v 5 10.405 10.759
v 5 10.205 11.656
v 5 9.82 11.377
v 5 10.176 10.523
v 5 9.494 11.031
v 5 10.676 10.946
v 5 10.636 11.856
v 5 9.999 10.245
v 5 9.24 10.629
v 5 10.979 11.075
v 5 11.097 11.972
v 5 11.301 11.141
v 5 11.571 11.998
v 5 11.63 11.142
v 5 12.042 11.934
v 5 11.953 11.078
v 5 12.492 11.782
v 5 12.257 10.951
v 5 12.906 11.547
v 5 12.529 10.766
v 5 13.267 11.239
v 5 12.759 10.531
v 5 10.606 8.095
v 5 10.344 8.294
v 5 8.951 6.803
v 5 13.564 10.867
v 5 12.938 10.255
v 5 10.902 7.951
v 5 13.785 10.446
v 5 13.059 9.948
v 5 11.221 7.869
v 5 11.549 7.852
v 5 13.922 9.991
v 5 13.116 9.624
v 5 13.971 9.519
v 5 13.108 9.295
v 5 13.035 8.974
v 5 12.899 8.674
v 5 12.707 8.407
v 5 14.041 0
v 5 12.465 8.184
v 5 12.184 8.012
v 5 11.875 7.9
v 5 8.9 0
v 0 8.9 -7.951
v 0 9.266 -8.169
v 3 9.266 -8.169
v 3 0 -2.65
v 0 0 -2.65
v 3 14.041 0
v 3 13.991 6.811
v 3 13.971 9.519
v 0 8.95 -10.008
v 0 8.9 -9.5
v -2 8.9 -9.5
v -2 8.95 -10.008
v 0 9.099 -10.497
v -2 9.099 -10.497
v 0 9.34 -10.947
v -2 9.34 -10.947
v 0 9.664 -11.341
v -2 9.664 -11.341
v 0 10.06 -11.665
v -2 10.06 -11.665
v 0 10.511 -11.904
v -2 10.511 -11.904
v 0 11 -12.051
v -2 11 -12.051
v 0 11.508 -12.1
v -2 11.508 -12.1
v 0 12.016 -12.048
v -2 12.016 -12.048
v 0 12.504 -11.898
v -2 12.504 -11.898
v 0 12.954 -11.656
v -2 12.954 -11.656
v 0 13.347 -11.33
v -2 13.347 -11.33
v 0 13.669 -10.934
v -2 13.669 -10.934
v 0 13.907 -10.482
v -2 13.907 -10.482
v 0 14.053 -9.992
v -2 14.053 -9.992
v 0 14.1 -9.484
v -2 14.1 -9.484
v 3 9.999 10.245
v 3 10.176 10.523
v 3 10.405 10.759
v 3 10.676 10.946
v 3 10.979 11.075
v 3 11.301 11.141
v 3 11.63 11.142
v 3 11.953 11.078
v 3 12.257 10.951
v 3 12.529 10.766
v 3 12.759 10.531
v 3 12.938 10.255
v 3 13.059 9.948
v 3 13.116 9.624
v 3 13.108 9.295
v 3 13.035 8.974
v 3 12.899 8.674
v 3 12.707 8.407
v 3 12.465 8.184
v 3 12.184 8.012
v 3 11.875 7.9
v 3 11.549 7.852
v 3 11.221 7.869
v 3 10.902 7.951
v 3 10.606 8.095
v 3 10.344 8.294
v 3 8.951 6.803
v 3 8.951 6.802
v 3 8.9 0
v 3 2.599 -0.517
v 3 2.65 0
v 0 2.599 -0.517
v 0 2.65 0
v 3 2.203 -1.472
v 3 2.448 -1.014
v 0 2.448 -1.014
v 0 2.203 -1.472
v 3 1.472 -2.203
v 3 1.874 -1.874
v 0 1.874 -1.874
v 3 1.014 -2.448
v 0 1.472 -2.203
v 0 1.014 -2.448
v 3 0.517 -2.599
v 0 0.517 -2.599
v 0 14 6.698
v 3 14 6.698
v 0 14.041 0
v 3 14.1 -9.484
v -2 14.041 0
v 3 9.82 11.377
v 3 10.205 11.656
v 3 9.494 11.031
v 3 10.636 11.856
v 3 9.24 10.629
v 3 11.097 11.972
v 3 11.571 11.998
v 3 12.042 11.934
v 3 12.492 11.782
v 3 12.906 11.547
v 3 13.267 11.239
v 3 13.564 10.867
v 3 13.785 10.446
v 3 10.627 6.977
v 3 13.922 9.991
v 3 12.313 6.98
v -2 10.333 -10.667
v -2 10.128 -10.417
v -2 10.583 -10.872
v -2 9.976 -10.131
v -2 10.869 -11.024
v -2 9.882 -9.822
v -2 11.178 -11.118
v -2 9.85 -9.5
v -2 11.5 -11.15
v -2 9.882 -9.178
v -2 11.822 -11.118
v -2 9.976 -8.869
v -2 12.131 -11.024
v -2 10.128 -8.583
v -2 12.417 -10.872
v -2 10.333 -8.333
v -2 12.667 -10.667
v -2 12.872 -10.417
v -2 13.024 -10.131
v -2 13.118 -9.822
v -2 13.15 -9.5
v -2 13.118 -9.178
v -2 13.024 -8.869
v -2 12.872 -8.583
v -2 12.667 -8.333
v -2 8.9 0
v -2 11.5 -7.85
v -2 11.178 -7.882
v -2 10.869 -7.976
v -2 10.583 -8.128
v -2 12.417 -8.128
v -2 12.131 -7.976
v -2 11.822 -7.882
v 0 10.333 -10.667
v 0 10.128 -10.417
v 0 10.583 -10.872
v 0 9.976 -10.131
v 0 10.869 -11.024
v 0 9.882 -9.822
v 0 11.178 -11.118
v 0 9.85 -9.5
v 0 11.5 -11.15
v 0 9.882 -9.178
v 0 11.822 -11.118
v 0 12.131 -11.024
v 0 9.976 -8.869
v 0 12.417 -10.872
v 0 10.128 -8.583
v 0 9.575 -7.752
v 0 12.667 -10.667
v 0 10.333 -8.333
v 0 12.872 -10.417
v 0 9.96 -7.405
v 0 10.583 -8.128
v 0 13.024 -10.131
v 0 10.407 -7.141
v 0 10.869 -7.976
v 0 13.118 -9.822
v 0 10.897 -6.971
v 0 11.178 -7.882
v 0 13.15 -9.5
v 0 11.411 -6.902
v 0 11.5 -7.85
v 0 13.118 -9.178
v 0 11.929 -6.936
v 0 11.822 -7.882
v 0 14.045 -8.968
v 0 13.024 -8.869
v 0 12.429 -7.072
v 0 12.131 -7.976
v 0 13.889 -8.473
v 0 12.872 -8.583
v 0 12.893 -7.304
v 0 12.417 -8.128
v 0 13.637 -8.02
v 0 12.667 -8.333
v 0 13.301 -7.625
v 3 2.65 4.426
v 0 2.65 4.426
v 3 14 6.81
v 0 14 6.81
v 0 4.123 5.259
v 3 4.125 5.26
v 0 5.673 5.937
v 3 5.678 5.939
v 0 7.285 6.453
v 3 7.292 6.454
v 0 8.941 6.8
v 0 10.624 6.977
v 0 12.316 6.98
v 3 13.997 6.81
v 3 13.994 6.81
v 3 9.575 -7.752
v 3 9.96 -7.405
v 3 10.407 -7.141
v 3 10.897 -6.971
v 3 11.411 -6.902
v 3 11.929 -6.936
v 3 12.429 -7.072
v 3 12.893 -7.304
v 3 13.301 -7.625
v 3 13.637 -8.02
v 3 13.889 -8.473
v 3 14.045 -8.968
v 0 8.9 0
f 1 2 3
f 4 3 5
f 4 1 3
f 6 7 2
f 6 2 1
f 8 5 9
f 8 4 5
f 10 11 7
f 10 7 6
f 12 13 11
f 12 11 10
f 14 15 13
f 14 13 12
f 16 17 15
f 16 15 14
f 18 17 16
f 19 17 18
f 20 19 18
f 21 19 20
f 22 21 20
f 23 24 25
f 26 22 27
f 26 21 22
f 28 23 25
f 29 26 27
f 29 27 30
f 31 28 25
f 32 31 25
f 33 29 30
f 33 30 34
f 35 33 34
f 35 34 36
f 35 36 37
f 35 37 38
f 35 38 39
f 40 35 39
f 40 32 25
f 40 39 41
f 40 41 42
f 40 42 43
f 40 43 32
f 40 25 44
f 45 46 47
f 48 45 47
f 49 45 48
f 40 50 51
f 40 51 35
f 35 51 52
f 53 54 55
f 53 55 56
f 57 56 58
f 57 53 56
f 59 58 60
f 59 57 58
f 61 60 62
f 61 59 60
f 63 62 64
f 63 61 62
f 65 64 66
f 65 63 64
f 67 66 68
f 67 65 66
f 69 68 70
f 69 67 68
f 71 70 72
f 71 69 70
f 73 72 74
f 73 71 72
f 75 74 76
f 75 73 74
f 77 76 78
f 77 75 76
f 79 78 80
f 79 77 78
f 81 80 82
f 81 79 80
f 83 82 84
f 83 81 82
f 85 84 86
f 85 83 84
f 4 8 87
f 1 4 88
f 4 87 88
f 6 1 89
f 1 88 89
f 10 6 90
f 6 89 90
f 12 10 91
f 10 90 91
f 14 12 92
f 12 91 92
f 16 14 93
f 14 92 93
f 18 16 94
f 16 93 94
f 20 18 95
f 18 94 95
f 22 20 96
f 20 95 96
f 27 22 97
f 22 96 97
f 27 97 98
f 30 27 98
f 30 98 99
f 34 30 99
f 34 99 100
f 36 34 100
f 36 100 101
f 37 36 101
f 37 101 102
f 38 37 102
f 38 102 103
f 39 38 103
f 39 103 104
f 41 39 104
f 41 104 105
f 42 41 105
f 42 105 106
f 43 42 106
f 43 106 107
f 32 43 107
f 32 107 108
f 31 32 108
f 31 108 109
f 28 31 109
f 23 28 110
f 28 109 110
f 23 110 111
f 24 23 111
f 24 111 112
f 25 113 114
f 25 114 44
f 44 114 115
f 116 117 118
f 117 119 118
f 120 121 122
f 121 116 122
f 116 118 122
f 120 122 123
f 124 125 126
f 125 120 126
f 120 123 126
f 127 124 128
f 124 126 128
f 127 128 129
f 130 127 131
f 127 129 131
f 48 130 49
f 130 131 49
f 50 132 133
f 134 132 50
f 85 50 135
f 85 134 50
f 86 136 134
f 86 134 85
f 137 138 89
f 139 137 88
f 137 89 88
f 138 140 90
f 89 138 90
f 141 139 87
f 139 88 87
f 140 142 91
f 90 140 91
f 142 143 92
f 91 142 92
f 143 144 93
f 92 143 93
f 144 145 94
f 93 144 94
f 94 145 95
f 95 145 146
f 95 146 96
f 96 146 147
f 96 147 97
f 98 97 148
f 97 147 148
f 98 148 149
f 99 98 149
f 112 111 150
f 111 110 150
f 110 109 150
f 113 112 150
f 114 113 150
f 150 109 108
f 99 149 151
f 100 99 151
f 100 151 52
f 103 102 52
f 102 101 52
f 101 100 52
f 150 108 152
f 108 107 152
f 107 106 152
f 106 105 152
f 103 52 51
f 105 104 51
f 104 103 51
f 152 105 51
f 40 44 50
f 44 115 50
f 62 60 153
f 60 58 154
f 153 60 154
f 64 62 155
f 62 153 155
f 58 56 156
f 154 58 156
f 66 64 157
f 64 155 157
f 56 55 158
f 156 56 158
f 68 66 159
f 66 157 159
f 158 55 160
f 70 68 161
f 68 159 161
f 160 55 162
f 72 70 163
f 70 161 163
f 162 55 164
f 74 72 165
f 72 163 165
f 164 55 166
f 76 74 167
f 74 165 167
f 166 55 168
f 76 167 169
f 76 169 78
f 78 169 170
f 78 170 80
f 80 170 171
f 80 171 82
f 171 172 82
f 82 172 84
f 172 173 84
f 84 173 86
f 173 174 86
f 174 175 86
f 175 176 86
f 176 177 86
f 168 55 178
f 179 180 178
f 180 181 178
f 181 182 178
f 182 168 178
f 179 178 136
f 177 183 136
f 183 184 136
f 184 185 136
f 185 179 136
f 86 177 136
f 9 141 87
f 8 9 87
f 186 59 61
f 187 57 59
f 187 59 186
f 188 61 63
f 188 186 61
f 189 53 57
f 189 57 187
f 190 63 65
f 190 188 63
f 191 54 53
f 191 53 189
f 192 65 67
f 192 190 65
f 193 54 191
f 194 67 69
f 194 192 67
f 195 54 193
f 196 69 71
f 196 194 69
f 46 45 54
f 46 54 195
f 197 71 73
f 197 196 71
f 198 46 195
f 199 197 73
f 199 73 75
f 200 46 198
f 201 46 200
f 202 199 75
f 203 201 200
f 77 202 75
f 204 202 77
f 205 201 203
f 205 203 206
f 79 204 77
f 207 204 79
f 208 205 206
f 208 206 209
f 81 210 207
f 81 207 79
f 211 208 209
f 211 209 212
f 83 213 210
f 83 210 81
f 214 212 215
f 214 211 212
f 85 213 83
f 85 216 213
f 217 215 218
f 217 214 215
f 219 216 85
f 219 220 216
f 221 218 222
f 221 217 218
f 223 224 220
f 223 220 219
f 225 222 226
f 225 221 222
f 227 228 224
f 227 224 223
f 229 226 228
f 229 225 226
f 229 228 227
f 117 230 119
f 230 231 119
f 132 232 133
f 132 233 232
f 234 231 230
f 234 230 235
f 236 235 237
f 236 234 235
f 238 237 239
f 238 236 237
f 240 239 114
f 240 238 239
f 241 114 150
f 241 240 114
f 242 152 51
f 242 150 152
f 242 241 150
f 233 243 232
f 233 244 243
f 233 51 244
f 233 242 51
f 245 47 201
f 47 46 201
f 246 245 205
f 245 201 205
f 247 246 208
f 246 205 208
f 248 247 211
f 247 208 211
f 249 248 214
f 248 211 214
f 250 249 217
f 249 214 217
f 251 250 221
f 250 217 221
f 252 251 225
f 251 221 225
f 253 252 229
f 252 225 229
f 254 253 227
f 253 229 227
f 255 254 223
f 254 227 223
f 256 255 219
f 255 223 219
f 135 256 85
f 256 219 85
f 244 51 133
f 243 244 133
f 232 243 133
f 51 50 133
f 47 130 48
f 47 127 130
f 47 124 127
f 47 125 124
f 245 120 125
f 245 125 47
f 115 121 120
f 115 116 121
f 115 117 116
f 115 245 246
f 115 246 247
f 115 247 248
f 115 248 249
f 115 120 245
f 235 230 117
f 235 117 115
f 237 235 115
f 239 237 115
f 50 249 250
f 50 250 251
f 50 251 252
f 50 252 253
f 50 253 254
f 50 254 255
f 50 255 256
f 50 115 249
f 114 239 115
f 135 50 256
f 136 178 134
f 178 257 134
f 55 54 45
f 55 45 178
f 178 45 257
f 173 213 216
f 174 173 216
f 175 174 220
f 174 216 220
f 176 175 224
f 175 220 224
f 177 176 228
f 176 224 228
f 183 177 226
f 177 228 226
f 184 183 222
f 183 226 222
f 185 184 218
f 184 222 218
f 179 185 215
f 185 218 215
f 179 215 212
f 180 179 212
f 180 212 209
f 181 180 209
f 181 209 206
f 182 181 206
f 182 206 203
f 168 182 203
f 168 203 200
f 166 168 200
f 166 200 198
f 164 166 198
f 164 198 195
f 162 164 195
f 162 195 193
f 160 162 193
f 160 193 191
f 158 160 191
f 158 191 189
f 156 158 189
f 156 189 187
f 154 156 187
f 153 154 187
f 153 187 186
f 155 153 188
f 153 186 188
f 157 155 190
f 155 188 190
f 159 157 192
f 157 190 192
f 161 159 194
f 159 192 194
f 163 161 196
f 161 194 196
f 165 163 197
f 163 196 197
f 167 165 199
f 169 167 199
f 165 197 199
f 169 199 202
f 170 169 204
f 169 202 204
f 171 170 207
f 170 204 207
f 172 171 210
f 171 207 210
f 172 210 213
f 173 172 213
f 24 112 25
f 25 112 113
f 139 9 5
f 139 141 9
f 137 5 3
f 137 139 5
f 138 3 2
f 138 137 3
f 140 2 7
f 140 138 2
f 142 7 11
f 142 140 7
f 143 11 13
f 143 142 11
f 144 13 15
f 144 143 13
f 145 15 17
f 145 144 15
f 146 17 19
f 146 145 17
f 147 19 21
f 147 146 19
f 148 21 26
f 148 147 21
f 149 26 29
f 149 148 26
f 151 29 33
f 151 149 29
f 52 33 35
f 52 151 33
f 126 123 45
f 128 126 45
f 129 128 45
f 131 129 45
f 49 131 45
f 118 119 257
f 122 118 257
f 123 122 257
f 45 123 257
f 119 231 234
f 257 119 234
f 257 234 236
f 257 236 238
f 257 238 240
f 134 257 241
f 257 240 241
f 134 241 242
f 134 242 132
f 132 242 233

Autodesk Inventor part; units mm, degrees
ref_plane "YZ Plane" through (0, 0, 0) normal (1, 0, 0) x (0, 1, 0)
ref_plane "XZ Plane" through (0, 0, 0) normal (0, 1, 0) x (-1, 0, 0)
ref_plane "XY Plane" through (0, 0, 0) normal (0, 0, 1) x (1, 0, 0)
sketch "スケッチ1" plane through (0, 0, 0) normal (1, 0, 0) x (0, 1, 0)
  line L0 (0, 0) -> (0, 6)
  line L1 (0, 6) -> (0, -6)
  line L2 (0, 0) -> (11.5, 0)
  line L3 (11.5, 0) -> (11.5, 9.5)
  line L4 (11.5, 9.5) -> (11.5, -9.5)
  circle A0 centre (0, 6) radius 1.25
  circle A1 centre (0, -6) radius 1.25
  circle A2 centre (11.5, 9.5) radius 1.65
  circle A3 centre (11.5, -9.5) radius 1.65
  circle A4 centre (11.5, 9.5) radius 2.5
  circle A5 centre (11.5, -9.5) radius 2.5
  circle A6 centre (0, 0) radius 2.65
  line L5 (0, 0) -> (-14.6, 0)
  circle A7 centre (-14.6, 0) radius 1.65
  circle A8 centre (-14.6, 0) radius 2.5
  circle A9 centre (0, 6) radius 2
  circle A10 centre (0, -6) radius 2
  line L6 (0, 8) -> (10.6499, 11.851)
  line L7 (0, -8) -> (10.6499, -11.851)
  line L8 (-14.6, 0) -> (-14.6, -2.5)
  line L9 (-14.6, 0) -> (-12.1, 0) construction
  line L10 (-14.6, -2.5) -> (-14.6, 2.5)
  line L11 (-14.6, -2.5) -> (-0.7212, -7.8655)
  line L12 (-14.6, 2.5) -> (-0.7212, 7.8655)
  circle A11 centre (11.5, -9.5) radius 14.9164
  line L13 (11.5, -9.5) -> (0, 0)
  line L14 (11.5, -9.5) -> (0, -2.65)
  line L15 (14, 9.5) -> (14, 6.6979)
  circle A12 centre (11.5, -9.5) radius 16.7294
  circle A13 centre (11.5, -9.5) radius 2.6
  circle A14 centre (11.5, -9.5) radius 16.5
  line L16 (14, 6.6979) -> (14.1, -9.4839)
  line L17 (8.9, -9.5) -> (8.9, 0)
  line L18 (9, 9.5) -> (9, 0)
  line L19 (14.0414, 0) -> (11.5, 0)
  line L20 (0, 2.65) -> (2.65, 2.65)
  line L21 (2.65, 2.65) -> (2.65, 0)
  line L22 (2.65, 2.65) -> (2.65, 4.4258)
  point P0 (9.3522, -8.2206)
  point P1 (0, 2.65)
  point P2 (12.4812, 7.2006)
  point P3 (14, 6.8095)
  point P4 (0.3158, 2.6311)
  point P5 (9.2662, -8.1695)
  dimension "d9" = 5
  dimension "d22" = 33
  dimension "d0" = 6
  dimension "d1" = 12
  dimension "d2" = 11.5
  dimension "d3" = 9.5
  dimension "d4" = 19
  dimension "d5" = 2.5
  dimension "d6" = 3.3
  dimension "d7" = 3.3
  dimension "d8" = 5
  dimension "d10" = 5.3
  dimension "d11" = 14.6
  dimension "d12" = 3.3
  dimension "d13" = 5
  dimension "d14" = 4
  dimension "d15" = 4
  dimension "d16" = 90
  dimension "d21" = 5.2
extrude "押し出し3" add sketch "スケッチ1" along normal blind 3 contours A6 L13 L17 L14 | L21 A11 L18 L2 | L2 L17 L13 A6 | L17 L13 A13 L14 | L2 L4 A13 L13 L17 | L21 L22 A14 L18 A11 | L18 A11 L3 L2 | L18 A14 L3 A11 | L19 L16 A13 L4 | L3 A11 L16 L19 | L3 A14 L15 L16 A11
extrude "押し出し4" add sketch "スケッチ1" against normal blind 2 contours L17 L13 A13 L14 | L14 A13 L17 | L2 L4 A13 L13 L17 | A13 L13 A5 L14 | L14 A5 L7 A13 | A13 L4 A5 L13 | L14 A3 L4 A5 | A5 L13 A3 L14 | L7 A5 L4 A13 | L19 L16 A13 L4 | A5 L4 A3 L13
sketch "スケッチ2" plane through (3, 0, 0) normal (1, 0, 0) x (0, 0, -1)
  line L0 (0, 0) -> (0, 11.4707)
  line L1 (0, 14.0414) -> (0, 8.9) projected
  line L2 (0, 11.4707) -> (-9.5, 11.4707)
  circle A0 centre (-9.5, 11.4707) radius 1.65
  circle A1 centre (-9.5, 11.4707) radius 2.5
  line L3 (-9.5186, 8.9708) -> (0, 8.9)
  line L4 (0, 11.4707) -> (0, 14.0414)
  line L5 (0, 14.0414) -> (-6.6979, 14) projected
  line L6 (0, 14.0414) -> (-9.5186, 13.9706)
  line L7 (-9.5, 11.4707) -> (-6.8033, 8.9506)
  line L8 (-9.5, 11.4707) -> (-12, 11.4707)
  line L9 (0, 8.9) -> (7.9513, 8.9) projected
  line L10 (-10.6293, 9.2403) -> (-9.5, 11.4707)
  point P0 (-11.15, 11.4707)
  point P1 (-8.2945, 10.3441)
  point P2 (-10.2453, 9.9986)
  dimension "d27" = 9.5
  dimension "d28" = 3.3
  dimension "d29" = 5
extrude "押し出し5" add sketch "スケッチ2" along normal blind 2 contours L3 L7 A1 L2 L0 | L2 A1 L6 L1 | A1 L7 A0 L2 | L2 A0 L8 A1 | A1 L8 A0 L10
properties part number "ikafly2c2"
